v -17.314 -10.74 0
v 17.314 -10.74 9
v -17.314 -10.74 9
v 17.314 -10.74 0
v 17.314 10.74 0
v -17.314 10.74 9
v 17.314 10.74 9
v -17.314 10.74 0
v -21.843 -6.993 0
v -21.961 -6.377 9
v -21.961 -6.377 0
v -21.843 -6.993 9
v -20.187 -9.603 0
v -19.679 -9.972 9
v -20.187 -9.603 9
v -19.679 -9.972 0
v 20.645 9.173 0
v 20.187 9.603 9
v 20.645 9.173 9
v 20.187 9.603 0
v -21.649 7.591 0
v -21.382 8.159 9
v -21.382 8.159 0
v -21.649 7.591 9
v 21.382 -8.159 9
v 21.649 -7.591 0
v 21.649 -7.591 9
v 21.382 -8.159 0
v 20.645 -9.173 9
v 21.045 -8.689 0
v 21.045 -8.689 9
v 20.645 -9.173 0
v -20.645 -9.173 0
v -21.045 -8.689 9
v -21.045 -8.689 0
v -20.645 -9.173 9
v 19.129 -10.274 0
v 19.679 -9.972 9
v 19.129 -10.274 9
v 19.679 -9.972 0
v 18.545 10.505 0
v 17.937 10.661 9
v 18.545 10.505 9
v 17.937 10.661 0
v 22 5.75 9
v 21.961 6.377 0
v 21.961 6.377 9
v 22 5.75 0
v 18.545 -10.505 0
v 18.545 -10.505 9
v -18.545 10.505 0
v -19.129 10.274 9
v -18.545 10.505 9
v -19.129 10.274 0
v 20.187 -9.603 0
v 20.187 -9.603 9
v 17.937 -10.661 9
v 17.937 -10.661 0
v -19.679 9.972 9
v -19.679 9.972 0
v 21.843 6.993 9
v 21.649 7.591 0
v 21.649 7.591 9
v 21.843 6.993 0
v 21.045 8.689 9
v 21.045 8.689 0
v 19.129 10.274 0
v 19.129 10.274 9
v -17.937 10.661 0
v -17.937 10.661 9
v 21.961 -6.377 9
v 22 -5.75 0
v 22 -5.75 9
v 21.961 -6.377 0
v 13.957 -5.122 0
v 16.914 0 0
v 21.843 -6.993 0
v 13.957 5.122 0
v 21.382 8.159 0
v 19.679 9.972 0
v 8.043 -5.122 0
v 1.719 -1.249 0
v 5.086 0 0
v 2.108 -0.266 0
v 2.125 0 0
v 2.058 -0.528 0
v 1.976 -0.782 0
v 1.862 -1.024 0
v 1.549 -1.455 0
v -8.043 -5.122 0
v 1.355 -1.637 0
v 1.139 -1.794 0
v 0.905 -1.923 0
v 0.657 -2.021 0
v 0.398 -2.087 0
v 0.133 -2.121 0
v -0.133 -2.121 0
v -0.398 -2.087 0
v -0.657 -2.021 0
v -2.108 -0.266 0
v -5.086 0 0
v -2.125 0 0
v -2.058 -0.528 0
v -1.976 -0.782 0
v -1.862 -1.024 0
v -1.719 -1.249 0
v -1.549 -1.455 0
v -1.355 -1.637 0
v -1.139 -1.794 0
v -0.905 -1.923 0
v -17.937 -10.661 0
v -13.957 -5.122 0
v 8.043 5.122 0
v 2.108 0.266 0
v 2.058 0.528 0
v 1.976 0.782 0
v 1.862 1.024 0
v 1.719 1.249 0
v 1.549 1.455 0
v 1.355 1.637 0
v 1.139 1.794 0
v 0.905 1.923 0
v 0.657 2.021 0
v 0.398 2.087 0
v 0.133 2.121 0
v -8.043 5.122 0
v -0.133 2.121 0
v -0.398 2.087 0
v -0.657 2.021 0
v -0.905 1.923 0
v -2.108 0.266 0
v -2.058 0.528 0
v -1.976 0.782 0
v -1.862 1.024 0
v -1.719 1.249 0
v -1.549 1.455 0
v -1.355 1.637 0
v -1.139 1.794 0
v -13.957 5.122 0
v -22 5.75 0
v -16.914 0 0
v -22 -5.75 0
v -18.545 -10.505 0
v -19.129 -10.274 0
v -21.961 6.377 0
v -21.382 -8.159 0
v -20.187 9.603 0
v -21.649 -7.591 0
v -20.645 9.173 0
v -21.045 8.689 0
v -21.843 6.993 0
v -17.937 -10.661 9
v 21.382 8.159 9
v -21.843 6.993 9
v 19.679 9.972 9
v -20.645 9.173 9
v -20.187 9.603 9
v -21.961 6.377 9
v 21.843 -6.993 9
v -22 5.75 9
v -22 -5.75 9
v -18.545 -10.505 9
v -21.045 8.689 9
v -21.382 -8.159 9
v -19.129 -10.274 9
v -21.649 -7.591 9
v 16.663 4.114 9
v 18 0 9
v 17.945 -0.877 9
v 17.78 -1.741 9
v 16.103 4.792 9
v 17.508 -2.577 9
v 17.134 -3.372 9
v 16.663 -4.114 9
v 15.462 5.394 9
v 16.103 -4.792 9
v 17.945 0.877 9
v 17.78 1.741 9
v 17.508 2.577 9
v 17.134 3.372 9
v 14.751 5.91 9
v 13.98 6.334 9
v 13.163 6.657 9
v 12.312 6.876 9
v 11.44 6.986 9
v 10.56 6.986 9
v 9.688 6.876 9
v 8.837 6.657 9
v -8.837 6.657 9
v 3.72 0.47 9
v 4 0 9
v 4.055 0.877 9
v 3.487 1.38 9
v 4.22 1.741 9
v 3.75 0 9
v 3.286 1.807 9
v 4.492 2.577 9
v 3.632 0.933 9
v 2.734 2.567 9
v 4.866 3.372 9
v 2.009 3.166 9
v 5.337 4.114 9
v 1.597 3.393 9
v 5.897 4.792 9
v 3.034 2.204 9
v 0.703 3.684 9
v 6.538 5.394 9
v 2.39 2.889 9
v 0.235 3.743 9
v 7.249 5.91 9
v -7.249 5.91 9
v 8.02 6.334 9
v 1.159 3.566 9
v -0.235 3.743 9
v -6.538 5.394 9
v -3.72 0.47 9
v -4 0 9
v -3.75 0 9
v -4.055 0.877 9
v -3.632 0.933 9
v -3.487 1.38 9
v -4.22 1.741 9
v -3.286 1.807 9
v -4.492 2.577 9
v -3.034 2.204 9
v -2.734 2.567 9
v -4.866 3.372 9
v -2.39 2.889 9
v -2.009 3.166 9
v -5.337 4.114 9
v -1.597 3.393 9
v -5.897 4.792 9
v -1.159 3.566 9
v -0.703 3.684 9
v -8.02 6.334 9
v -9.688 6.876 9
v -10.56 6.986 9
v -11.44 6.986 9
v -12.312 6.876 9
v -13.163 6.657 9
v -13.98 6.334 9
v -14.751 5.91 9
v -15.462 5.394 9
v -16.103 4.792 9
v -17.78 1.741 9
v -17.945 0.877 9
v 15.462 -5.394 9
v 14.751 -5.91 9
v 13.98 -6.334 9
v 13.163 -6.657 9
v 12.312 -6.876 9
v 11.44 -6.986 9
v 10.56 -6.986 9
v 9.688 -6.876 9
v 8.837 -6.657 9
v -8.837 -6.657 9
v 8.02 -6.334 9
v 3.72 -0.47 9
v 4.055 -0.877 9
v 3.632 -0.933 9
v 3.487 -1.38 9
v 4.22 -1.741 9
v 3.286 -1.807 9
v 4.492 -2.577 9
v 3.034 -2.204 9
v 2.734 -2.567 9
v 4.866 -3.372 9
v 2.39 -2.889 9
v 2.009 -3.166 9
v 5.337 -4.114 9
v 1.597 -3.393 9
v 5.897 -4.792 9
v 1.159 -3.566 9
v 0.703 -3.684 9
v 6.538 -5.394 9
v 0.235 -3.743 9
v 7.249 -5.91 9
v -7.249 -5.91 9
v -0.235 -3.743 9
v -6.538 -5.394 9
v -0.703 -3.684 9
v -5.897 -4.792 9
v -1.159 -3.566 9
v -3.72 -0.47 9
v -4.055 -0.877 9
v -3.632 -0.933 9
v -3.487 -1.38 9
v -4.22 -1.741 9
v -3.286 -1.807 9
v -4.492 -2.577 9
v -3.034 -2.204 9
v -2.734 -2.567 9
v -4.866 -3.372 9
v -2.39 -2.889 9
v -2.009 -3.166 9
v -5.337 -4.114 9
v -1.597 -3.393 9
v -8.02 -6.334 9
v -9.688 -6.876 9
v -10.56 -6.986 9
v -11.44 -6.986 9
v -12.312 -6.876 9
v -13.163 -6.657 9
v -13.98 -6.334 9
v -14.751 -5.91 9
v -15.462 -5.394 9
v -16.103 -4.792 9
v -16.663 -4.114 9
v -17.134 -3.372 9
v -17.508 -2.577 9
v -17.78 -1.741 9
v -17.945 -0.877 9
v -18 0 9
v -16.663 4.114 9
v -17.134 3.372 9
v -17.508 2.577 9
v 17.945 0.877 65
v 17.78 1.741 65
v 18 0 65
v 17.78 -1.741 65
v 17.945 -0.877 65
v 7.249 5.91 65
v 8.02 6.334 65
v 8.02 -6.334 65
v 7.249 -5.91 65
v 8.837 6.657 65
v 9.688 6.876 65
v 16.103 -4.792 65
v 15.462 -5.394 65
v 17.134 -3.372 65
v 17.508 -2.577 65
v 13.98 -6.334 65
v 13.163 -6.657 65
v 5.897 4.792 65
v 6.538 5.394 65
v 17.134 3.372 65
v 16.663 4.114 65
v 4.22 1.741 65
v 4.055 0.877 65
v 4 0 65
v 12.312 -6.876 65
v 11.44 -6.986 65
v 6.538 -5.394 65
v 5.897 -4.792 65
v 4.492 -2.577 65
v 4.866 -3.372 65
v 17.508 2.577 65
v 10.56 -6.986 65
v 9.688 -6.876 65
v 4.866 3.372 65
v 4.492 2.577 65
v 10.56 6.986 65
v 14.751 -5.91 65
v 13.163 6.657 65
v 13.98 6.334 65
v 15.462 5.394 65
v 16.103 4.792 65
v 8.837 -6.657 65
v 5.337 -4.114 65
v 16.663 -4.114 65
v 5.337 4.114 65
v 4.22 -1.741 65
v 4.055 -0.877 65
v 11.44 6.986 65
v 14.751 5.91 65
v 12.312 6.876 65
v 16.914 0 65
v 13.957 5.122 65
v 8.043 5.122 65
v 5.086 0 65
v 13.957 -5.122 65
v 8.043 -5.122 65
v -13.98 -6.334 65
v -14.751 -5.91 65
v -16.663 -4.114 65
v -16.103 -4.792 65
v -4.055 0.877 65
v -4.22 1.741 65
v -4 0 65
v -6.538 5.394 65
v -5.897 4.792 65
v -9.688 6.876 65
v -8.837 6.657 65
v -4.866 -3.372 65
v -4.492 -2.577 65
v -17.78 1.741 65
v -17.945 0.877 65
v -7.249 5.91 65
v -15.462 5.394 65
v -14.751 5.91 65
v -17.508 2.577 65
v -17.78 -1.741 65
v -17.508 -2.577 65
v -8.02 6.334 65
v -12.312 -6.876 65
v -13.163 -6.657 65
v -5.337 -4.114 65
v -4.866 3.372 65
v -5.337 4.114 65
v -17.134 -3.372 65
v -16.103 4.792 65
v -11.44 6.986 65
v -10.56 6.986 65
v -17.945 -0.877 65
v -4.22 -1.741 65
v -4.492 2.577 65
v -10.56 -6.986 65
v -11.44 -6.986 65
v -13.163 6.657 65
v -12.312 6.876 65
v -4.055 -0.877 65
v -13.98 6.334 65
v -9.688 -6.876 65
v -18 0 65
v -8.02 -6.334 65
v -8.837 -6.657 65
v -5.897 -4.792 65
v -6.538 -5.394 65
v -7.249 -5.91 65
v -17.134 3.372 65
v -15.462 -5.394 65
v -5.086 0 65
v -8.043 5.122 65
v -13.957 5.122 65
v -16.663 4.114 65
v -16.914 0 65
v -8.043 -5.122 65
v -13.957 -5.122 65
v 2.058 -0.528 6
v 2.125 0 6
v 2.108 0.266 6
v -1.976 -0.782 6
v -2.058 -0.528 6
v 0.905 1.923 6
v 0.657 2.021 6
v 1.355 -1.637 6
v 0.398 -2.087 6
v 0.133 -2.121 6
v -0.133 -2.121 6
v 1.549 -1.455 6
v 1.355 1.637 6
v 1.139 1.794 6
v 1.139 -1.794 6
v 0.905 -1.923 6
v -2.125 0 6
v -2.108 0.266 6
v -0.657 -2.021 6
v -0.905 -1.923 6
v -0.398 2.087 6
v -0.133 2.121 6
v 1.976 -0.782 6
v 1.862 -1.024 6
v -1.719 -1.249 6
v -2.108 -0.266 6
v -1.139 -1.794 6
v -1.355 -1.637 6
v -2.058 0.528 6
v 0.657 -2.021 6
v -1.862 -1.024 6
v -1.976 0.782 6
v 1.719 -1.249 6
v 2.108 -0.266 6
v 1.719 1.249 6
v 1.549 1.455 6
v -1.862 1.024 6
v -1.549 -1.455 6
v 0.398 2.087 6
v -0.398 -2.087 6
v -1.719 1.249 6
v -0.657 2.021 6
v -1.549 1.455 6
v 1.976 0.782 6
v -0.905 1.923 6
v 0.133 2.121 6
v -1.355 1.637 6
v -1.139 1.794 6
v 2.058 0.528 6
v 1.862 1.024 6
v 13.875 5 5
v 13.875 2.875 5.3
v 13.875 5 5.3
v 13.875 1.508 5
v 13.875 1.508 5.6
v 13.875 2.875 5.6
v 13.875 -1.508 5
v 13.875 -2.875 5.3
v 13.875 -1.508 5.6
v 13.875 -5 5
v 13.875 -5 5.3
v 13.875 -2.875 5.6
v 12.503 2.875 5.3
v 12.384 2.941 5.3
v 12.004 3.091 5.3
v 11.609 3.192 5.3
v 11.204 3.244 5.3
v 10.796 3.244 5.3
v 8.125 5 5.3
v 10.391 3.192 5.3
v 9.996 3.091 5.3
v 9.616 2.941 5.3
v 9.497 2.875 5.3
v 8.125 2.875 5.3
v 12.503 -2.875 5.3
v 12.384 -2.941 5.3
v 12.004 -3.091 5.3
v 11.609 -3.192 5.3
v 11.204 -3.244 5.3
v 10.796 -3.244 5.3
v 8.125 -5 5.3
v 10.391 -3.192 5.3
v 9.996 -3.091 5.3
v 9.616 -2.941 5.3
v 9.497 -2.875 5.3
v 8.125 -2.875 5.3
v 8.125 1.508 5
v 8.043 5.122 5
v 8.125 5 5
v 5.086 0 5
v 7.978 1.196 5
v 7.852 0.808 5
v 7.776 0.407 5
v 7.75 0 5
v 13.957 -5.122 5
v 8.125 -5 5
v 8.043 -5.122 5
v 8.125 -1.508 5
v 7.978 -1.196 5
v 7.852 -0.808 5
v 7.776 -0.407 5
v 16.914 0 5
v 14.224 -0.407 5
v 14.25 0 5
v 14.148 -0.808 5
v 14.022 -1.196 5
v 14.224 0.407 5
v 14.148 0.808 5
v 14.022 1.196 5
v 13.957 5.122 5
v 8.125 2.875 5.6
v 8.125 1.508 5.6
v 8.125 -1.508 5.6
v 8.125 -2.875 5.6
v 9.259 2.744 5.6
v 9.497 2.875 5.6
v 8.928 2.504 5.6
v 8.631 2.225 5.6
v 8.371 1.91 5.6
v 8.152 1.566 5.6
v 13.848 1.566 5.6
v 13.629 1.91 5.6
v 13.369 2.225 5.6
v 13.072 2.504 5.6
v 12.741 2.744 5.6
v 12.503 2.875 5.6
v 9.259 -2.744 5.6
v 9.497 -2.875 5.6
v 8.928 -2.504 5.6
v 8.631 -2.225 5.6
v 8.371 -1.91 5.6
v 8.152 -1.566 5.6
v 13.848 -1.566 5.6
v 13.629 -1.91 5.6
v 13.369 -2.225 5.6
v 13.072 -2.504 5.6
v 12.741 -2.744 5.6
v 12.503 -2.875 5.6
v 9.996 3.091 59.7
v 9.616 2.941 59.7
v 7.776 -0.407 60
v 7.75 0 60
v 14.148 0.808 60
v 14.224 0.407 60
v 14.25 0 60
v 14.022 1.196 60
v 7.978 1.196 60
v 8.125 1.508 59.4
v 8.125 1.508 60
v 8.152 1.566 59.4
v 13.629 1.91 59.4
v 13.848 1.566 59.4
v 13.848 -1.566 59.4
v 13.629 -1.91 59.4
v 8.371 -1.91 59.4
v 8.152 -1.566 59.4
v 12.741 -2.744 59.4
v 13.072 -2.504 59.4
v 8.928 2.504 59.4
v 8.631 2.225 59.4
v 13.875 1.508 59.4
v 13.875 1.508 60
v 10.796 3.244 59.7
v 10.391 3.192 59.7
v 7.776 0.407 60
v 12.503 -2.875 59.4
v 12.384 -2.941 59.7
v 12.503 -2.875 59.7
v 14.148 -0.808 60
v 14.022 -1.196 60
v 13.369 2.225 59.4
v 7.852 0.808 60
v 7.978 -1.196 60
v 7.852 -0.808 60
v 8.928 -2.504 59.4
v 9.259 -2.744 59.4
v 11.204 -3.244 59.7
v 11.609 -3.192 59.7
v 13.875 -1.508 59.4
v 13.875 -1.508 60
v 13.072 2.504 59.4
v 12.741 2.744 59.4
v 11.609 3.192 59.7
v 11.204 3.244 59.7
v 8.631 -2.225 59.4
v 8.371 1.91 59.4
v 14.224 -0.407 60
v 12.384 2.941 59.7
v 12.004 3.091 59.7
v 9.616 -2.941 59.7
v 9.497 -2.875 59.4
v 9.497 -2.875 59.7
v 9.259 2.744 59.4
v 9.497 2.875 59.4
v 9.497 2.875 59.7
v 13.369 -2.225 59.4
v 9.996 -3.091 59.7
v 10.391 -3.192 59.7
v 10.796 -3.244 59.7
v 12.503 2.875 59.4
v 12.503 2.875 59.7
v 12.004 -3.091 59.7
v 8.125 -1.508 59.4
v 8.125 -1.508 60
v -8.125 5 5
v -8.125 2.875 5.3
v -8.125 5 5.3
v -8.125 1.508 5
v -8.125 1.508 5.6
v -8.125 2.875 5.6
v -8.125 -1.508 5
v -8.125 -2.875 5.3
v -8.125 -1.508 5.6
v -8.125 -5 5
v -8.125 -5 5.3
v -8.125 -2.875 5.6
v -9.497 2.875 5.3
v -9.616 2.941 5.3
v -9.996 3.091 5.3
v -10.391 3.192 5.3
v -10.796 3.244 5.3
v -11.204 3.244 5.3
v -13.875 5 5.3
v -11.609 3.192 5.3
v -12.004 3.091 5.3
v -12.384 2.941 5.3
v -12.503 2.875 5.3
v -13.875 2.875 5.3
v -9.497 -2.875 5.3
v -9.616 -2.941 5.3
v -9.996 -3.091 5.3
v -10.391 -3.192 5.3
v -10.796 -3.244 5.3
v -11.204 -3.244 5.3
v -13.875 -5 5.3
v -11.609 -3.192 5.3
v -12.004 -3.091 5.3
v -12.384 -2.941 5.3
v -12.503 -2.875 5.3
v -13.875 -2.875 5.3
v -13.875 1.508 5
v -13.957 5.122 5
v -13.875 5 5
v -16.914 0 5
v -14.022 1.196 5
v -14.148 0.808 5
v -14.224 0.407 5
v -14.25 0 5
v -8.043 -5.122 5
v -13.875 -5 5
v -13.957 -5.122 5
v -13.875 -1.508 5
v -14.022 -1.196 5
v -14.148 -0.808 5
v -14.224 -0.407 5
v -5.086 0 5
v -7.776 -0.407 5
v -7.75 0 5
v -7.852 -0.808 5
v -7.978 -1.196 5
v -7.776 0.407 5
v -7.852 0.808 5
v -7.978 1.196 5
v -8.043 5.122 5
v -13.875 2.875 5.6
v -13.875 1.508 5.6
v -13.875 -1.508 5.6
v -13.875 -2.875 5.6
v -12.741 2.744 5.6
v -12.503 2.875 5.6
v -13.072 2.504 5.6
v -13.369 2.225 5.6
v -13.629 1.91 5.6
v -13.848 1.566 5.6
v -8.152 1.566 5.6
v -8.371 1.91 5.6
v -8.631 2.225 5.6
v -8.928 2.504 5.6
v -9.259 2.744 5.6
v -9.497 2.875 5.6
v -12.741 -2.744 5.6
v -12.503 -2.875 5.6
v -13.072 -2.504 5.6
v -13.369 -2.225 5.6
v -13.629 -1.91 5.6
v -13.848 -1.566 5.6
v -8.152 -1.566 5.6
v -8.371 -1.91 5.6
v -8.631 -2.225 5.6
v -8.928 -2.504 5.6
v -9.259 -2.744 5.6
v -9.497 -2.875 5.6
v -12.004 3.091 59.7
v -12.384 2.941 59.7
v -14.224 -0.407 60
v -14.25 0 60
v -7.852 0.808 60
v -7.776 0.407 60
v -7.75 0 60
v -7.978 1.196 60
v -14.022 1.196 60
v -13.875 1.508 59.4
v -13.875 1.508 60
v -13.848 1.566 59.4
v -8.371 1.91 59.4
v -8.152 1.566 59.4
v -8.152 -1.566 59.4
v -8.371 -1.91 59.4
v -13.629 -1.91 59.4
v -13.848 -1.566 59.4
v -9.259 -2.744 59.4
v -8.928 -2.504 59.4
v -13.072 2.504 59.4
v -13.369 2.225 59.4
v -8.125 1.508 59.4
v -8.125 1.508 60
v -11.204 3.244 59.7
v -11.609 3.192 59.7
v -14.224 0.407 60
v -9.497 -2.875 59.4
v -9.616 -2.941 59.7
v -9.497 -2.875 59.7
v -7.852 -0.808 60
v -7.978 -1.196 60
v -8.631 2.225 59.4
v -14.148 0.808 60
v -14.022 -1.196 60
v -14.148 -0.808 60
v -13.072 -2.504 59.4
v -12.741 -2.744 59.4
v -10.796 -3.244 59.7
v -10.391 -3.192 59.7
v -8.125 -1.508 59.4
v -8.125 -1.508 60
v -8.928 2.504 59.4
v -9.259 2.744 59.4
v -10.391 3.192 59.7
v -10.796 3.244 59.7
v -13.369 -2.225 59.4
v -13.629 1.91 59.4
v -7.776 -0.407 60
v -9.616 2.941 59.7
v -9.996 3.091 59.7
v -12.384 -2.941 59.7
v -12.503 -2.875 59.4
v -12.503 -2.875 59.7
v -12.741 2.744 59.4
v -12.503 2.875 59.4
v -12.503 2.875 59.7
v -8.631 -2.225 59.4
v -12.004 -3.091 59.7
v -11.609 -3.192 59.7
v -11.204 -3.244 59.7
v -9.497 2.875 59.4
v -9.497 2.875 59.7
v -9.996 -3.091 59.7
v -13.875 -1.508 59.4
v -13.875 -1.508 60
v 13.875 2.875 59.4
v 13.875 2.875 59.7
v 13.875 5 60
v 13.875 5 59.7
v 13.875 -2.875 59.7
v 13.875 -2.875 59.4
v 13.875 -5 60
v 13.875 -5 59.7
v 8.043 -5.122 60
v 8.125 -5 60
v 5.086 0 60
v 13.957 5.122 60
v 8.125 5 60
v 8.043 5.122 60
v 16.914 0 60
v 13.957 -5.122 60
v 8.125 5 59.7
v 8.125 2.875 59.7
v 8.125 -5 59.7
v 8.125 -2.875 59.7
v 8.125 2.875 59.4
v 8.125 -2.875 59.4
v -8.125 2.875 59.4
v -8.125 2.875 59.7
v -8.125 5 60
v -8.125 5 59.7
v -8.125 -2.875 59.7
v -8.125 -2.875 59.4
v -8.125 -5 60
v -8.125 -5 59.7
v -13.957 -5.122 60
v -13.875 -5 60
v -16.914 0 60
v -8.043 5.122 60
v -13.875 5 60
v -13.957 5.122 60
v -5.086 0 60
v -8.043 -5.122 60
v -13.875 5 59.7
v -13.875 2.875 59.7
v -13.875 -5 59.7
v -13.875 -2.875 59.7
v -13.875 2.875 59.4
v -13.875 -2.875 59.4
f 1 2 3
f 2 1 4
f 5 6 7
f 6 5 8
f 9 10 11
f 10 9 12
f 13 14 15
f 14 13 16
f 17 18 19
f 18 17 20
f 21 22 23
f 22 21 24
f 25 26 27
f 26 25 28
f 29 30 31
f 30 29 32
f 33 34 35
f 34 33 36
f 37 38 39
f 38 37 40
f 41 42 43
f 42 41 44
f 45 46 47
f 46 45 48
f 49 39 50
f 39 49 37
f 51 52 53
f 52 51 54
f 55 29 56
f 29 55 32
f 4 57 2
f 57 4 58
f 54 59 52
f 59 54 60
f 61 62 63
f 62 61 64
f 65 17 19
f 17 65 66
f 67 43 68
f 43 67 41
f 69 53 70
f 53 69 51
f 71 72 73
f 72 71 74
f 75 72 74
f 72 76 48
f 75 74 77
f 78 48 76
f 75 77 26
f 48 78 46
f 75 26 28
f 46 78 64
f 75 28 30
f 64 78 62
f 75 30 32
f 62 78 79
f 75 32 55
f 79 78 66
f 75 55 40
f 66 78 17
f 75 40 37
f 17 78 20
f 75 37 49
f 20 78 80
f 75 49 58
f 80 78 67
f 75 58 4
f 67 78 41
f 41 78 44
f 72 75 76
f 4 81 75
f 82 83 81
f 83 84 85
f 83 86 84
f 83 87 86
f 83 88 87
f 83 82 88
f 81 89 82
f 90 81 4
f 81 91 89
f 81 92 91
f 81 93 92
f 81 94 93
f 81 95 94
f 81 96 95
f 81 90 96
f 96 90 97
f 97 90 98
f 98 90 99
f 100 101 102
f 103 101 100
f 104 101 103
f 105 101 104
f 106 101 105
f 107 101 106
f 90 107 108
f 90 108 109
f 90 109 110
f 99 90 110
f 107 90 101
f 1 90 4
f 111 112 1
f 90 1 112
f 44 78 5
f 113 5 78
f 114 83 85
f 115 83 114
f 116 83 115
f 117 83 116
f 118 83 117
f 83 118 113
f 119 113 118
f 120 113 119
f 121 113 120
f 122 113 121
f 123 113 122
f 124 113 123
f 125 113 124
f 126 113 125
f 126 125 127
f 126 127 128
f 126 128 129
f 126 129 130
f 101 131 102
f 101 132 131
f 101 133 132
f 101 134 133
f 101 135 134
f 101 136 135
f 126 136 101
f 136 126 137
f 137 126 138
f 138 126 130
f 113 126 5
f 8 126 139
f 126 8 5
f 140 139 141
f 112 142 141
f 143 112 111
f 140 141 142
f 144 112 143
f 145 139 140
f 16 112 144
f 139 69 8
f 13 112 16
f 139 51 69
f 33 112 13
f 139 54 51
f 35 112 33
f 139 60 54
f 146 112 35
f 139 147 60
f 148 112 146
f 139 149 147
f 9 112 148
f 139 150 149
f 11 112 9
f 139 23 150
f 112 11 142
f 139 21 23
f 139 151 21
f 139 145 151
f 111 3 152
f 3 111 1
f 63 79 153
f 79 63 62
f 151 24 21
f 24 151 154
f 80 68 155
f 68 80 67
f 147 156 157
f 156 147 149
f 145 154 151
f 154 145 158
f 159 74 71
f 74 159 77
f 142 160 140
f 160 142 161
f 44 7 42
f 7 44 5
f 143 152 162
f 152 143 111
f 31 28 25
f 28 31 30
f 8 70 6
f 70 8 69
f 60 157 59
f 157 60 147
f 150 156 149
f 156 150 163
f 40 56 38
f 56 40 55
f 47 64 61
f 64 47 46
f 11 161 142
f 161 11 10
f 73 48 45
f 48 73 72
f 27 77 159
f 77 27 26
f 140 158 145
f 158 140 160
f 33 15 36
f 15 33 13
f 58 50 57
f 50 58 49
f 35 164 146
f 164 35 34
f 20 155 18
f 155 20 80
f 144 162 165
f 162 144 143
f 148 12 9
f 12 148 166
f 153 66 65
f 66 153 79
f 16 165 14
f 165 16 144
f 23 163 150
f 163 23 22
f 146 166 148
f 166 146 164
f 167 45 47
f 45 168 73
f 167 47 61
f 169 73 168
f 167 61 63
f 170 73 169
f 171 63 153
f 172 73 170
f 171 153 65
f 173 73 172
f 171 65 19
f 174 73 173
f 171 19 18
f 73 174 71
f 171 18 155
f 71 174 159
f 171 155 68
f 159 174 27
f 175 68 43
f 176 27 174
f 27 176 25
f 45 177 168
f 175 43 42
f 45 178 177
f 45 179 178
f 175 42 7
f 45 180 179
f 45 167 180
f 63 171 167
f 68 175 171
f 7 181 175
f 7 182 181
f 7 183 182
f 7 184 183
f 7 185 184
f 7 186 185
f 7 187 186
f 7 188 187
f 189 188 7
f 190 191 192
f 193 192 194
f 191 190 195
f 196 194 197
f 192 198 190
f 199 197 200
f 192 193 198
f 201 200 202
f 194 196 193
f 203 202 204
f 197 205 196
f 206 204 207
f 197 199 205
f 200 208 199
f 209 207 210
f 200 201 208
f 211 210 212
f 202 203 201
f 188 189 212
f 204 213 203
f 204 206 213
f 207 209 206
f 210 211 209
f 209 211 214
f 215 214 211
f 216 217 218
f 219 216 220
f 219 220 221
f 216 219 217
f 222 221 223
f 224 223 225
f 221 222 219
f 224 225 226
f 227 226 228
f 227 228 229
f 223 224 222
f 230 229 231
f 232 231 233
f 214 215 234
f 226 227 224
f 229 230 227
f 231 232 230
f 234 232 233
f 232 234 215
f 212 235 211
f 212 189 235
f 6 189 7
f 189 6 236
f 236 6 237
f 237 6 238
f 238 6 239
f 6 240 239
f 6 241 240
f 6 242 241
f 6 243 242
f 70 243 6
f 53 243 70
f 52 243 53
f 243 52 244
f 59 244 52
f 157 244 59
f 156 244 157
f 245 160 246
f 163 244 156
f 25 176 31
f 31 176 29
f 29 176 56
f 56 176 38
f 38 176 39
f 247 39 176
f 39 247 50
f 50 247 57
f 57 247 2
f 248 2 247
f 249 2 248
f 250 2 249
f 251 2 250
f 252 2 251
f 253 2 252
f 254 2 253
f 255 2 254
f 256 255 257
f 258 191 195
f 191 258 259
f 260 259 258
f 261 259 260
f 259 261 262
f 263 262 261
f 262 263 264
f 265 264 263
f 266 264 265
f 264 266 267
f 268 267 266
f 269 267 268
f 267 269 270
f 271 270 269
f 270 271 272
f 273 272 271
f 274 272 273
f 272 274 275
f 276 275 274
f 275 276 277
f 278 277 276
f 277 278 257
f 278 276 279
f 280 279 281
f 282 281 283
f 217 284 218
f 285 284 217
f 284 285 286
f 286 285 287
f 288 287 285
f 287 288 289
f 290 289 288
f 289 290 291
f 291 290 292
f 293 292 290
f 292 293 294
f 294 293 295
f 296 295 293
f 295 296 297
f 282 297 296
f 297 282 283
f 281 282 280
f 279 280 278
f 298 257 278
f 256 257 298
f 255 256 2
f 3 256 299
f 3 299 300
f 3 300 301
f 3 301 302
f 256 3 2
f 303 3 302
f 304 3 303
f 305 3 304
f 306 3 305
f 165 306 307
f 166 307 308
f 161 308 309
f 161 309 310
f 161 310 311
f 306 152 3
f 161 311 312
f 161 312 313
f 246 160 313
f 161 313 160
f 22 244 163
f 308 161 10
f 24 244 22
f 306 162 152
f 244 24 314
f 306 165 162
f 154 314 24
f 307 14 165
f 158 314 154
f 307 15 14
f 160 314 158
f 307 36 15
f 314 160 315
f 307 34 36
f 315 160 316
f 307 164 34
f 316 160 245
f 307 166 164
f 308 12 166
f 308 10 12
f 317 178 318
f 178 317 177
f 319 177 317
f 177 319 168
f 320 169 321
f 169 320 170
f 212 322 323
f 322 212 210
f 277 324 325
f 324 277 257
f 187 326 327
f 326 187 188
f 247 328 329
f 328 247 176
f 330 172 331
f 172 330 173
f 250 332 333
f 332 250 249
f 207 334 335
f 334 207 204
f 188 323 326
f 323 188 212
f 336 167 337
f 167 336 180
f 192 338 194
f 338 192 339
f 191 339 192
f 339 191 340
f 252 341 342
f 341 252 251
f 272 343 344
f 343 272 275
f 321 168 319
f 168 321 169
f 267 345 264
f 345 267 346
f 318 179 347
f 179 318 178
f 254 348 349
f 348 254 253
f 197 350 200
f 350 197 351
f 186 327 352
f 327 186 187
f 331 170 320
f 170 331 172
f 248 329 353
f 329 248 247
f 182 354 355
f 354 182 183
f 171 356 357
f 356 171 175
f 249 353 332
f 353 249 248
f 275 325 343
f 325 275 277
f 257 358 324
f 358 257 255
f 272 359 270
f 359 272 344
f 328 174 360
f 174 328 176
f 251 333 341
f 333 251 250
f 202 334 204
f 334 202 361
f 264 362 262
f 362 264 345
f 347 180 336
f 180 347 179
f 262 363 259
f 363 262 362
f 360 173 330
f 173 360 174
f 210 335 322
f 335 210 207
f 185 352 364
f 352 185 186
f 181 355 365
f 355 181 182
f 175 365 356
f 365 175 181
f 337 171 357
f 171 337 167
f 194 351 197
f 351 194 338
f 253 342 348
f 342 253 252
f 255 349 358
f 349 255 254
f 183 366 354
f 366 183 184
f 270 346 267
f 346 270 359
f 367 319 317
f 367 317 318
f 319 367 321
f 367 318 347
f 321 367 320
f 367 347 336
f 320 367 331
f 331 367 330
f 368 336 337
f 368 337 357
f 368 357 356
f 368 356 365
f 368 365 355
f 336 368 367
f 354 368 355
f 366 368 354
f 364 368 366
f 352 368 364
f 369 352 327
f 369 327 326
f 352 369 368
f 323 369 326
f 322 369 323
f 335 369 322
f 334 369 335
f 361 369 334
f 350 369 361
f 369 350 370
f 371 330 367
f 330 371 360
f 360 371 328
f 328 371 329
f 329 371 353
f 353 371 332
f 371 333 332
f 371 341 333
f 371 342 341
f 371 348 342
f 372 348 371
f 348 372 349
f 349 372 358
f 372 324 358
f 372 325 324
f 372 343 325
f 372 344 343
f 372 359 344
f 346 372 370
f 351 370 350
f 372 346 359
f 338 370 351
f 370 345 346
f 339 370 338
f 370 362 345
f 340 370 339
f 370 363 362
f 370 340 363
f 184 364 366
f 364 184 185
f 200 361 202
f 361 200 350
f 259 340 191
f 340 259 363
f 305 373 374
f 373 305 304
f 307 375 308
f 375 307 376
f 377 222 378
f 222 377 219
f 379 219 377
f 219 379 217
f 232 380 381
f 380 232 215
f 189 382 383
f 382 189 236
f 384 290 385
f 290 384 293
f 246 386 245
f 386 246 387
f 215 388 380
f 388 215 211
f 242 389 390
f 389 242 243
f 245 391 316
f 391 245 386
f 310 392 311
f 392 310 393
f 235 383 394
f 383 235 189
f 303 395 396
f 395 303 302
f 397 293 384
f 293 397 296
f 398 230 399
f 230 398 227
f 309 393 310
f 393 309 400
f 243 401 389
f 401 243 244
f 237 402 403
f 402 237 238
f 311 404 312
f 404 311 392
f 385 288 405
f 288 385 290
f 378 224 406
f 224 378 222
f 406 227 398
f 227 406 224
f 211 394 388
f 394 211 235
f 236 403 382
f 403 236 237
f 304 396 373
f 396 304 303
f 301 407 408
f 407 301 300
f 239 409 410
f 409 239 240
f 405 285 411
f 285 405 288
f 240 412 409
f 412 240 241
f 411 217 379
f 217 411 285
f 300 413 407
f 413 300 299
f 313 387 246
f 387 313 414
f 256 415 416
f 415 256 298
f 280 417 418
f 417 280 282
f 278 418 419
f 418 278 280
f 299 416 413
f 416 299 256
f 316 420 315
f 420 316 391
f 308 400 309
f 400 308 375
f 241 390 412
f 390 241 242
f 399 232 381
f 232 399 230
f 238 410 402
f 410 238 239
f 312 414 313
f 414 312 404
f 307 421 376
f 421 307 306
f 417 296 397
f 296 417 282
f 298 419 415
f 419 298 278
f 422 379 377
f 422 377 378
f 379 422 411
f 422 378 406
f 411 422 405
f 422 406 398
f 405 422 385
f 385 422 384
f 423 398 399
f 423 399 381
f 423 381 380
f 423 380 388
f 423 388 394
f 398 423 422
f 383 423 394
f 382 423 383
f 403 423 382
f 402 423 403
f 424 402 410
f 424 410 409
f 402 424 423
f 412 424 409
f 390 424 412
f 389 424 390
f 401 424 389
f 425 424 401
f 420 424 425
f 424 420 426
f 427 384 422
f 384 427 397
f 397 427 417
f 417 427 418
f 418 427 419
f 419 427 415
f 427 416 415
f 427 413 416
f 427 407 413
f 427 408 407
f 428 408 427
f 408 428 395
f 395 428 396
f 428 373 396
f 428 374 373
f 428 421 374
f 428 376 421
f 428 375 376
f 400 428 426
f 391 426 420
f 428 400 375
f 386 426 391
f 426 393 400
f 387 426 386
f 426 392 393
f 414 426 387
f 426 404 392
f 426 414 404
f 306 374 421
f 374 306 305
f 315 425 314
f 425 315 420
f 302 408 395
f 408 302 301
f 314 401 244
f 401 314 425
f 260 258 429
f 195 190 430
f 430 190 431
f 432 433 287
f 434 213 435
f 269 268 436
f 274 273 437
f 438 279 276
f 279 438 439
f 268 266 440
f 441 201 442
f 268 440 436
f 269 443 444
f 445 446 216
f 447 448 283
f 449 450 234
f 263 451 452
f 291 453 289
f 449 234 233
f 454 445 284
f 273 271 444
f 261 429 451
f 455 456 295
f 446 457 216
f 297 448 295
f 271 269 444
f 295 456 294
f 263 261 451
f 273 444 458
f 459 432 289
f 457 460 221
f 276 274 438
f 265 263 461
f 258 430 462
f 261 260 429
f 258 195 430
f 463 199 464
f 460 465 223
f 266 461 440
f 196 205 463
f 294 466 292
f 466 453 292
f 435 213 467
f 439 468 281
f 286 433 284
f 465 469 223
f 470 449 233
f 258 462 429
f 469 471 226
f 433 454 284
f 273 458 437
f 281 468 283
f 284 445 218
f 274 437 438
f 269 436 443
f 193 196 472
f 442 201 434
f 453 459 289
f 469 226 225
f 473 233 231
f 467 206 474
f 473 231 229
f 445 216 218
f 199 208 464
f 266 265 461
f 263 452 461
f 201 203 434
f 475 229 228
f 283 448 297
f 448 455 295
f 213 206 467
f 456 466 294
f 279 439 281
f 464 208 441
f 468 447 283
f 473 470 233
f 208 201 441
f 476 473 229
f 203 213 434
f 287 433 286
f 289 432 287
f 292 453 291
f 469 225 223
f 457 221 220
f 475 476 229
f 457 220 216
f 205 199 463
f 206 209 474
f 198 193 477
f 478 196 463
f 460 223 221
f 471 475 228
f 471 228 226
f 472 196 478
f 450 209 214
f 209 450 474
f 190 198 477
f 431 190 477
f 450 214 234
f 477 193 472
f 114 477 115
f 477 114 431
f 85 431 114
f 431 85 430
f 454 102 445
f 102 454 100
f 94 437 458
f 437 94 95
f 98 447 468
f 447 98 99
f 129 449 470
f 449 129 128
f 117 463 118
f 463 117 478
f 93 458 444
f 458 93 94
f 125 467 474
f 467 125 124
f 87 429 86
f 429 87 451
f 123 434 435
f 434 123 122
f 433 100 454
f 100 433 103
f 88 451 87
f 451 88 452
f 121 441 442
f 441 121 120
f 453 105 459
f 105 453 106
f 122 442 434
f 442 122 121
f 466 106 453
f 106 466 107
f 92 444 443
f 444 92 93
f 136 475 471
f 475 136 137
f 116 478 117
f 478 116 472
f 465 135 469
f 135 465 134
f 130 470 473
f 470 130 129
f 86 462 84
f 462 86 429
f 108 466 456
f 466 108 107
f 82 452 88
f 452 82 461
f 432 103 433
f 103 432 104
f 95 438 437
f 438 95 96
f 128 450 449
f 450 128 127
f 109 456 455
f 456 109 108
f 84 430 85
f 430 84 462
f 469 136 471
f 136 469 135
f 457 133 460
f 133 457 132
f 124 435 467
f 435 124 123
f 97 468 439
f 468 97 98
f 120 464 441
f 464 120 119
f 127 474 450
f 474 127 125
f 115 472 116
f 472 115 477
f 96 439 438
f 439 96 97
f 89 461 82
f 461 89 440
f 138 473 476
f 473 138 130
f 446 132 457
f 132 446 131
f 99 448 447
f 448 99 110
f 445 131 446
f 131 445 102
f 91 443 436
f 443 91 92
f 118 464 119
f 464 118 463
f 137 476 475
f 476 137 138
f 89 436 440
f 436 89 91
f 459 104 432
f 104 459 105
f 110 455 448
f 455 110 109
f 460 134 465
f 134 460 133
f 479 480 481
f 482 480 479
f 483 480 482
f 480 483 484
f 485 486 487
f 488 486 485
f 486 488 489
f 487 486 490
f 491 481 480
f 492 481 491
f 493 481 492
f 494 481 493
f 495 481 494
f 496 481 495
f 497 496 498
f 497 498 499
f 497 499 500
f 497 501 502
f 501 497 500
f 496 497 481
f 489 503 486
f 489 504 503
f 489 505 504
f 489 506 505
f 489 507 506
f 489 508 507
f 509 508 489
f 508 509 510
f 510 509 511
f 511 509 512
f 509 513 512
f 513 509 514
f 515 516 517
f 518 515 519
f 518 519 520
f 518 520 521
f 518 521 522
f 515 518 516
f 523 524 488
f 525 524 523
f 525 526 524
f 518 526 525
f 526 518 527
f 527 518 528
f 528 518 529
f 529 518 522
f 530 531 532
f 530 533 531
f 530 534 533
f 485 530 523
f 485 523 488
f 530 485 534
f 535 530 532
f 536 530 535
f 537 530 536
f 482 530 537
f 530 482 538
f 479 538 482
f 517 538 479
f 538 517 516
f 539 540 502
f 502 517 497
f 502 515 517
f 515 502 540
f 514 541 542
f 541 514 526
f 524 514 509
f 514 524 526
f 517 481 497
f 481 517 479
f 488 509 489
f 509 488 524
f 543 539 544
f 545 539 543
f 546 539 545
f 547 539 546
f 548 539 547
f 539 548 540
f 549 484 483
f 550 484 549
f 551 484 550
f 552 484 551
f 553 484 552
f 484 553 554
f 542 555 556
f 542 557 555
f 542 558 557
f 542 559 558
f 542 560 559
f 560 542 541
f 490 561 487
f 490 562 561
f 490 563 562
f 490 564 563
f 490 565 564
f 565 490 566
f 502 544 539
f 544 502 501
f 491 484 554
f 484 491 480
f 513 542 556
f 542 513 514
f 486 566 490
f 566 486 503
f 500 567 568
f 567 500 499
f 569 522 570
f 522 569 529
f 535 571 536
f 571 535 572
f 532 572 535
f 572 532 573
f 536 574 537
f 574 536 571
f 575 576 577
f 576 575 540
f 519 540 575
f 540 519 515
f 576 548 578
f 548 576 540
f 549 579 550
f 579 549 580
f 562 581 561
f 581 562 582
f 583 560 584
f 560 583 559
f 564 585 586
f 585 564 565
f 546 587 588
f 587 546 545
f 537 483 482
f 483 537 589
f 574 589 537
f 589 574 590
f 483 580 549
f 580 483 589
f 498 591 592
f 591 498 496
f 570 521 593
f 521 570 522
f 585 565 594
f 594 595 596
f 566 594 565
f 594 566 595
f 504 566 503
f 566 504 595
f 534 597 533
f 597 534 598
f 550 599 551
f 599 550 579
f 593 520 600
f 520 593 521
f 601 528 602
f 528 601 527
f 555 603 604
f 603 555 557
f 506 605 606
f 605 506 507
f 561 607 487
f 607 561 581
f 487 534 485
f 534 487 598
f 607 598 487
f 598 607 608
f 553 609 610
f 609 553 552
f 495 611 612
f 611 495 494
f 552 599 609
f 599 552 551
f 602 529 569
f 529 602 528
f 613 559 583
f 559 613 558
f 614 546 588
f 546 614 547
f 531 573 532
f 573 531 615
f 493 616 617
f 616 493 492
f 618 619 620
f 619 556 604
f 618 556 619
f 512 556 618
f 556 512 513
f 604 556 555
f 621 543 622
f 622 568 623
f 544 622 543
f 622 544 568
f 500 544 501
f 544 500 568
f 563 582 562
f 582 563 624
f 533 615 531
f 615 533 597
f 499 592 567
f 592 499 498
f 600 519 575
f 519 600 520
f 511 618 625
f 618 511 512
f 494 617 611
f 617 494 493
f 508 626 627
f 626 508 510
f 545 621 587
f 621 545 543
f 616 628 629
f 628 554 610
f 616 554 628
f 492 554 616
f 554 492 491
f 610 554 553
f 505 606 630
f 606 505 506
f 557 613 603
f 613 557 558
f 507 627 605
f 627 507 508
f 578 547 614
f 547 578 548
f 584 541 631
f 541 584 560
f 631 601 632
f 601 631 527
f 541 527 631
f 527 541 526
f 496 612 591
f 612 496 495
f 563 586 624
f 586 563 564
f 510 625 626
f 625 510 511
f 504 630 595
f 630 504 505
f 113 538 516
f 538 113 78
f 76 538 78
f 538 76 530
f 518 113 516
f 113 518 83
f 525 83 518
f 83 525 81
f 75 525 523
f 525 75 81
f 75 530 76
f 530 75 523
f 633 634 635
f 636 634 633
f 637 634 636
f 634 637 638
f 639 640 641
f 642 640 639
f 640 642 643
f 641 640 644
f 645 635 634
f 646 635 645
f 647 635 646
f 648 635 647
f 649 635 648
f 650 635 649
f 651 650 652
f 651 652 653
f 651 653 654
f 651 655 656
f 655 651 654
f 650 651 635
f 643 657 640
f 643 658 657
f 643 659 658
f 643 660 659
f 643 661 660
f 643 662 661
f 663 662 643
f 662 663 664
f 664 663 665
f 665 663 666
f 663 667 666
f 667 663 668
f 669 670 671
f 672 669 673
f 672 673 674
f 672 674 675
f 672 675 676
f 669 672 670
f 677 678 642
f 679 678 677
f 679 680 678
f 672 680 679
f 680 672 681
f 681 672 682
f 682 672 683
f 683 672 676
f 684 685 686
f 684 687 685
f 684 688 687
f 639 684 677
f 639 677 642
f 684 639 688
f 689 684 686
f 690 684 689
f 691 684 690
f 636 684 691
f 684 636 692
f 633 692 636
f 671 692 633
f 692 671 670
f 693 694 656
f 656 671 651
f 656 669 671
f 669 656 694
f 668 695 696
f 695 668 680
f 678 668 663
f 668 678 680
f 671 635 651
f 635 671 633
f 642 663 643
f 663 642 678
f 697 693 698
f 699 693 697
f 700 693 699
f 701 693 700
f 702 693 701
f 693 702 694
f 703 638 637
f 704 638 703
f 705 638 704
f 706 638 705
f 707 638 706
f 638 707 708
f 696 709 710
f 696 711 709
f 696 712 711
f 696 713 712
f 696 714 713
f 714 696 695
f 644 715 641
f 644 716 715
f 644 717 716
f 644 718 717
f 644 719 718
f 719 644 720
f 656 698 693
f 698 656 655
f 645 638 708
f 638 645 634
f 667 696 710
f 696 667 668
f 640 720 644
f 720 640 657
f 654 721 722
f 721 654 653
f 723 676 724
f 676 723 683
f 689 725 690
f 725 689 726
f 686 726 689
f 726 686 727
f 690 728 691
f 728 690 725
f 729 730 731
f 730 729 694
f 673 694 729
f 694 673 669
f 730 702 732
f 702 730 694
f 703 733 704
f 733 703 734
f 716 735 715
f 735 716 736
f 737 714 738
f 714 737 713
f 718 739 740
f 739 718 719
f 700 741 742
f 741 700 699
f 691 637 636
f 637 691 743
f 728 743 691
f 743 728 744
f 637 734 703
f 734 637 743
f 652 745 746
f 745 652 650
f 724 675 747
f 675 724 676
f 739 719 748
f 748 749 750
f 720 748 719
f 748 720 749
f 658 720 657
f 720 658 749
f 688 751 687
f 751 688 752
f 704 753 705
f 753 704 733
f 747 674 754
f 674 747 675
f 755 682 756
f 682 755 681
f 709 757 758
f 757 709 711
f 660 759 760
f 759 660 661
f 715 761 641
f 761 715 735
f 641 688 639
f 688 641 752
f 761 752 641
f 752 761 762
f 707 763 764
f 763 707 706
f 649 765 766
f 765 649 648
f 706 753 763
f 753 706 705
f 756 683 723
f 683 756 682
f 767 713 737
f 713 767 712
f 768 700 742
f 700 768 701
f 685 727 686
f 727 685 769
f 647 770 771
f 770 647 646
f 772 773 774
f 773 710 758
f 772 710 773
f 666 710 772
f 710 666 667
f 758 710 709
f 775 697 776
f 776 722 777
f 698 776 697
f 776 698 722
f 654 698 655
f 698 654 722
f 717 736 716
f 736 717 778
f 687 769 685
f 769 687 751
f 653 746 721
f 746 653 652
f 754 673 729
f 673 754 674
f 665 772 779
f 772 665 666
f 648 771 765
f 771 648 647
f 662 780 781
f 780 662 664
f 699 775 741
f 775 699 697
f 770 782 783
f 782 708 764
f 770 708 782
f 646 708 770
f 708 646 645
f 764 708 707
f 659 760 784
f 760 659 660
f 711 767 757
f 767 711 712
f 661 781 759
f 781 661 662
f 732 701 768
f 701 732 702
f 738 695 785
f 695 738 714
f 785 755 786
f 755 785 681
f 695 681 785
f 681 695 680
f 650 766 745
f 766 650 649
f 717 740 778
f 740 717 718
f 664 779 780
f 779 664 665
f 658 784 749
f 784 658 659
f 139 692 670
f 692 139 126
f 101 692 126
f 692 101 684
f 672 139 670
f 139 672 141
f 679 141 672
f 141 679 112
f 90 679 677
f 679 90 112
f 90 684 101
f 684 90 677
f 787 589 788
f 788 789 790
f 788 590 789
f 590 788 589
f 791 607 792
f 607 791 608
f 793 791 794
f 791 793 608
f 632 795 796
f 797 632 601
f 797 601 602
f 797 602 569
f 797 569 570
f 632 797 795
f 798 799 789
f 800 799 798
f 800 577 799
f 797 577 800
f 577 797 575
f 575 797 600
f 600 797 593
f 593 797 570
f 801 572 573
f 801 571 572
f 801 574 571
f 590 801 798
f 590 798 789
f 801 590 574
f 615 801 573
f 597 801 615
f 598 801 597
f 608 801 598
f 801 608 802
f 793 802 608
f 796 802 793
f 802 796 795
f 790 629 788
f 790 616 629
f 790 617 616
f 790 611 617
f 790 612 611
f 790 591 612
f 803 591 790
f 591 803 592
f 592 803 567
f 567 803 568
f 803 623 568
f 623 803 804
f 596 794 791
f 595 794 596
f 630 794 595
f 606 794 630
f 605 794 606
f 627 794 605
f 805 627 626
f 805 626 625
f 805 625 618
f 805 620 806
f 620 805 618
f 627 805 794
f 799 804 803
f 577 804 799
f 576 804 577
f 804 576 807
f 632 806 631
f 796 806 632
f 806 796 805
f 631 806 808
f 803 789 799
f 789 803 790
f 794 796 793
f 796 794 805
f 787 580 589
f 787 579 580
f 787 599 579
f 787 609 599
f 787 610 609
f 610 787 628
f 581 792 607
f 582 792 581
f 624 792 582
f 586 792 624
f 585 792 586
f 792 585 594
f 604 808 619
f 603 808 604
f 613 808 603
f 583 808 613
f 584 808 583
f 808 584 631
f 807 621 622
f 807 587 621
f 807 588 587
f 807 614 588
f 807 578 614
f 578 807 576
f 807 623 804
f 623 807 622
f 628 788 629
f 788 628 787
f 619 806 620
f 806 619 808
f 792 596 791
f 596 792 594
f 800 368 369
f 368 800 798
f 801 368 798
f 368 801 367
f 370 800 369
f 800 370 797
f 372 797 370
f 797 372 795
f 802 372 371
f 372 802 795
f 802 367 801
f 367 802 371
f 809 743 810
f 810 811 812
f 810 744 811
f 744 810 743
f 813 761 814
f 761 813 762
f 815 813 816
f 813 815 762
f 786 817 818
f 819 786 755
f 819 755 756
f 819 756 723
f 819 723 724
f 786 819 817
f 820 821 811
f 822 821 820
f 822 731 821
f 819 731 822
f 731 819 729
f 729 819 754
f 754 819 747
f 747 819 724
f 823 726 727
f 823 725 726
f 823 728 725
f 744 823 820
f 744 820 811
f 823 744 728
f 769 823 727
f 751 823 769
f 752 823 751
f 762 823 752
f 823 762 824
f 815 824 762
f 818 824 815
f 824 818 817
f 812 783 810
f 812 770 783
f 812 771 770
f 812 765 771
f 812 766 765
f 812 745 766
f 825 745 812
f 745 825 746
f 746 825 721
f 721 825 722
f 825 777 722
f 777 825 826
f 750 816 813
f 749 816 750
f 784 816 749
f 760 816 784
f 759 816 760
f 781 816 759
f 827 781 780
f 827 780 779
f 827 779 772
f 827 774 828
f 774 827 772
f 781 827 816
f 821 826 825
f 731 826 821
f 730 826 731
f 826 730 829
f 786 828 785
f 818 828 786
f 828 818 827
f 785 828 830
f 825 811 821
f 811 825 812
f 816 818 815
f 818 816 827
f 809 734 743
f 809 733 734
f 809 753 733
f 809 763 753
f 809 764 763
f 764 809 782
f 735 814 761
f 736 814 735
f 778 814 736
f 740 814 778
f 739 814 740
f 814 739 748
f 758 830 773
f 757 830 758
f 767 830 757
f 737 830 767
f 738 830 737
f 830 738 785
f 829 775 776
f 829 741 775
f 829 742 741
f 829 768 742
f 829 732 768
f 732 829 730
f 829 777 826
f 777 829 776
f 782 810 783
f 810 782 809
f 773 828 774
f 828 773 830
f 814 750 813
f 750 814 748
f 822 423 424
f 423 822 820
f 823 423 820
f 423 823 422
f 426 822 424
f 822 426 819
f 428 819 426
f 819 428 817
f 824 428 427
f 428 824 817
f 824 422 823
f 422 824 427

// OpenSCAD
$fn = 50;


difference() {
	union() {
		hull() {
			translate(v = [-17.0000000000, 5.7500000000, 0]) {
				cylinder(h = 9, r = 5);
			}
			translate(v = [17.0000000000, 5.7500000000, 0]) {
				cylinder(h = 9, r = 5);
			}
			translate(v = [-17.0000000000, -5.7500000000, 0]) {
				cylinder(h = 9, r = 5);
			}
			translate(v = [17.0000000000, -5.7500000000, 0]) {
				cylinder(h = 9, r = 5);
			}
		}
		translate(v = [11.0000000000, 0, 0.0000000000]) {
			cylinder(h = 65, r = 7.0000000000);
		}
		translate(v = [-11.0000000000, 0, 0.0000000000]) {
			cylinder(h = 65, r = 7.0000000000);
		}
	}
	union() {
		translate(v = [0, 0, 9]) {
			rotate(a = [0, 0, 0]) {
				difference() {
					union() {
						#translate(v = [0, 0, -60.0000000000]) {
							cylinder(h = 60, r = 2.0000000000);
						}
						#translate(v = [0, 0, -3]) {
							cylinder(h = 3, r1 = 2.1250000000, r2 = 3.7500000000);
						}
						#translate(v = [0, 0, -60.0000000000]) {
							cylinder(h = 60, r = 2.1250000000);
						}
						#translate(v = [0, 0, -60.0000000000]) {
							cylinder(h = 60, r = 2.0000000000);
						}
					}
					union();
				}
			}
		}
		translate(v = [11.0000000000, 0, 0]) {
			rotate(a = [0, 0, 0]) {
				difference() {
					union() {
						#translate(v = [-2.8750000000, -5.0000000000, -0.3000000000]) {
							cube(size = [5.7500000000, 10, 0.3000000000]);
						}
						#translate(v = [-2.8750000000, -2.8750000000, -0.6000000000]) {
							cube(size = [5.7500000000, 5.7500000000, 0.3000000000]);
						}
						#translate(v = [-2.8750000000, -5.0000000000, 5]) {
							cube(size = [5.7500000000, 10, 0.3000000000]);
						}
						#translate(v = [-2.8750000000, -2.8750000000, 5.3000000000]) {
							cube(size = [5.7500000000, 5.7500000000, 0.3000000000]);
						}
						#translate(v = [0, 0, -100.0000000000]) {
							cylinder(h = 200, r = 3.2500000000);
						}
						#linear_extrude(height = 5) {
							polygon(points = [[5.9142500000, 0.0000000000], [2.9571250000, 5.1218907443], [-2.9571250000, 5.1218907443], [-5.9142500000, 0.0000000000], [-2.9571250000, -5.1218907443], [2.9571250000, -5.1218907443]]);
						}
						#translate(v = [-2.8750000000, -5.0000000000, -0.3000000000]) {
							cube(size = [5.7500000000, 10, 0.3000000000]);
						}
						#translate(v = [-2.8750000000, -2.8750000000, -0.6000000000]) {
							cube(size = [5.7500000000, 5.7500000000, 0.3000000000]);
						}
						#translate(v = [-2.8750000000, -5.0000000000, 5]) {
							cube(size = [5.7500000000, 10, 0.3000000000]);
						}
						#translate(v = [-2.8750000000, -2.8750000000, 5.3000000000]) {
							cube(size = [5.7500000000, 5.7500000000, 0.3000000000]);
						}
						#translate(v = [0, 0, -100.0000000000]) {
							cylinder(h = 200, r = 3.2500000000);
						}
						#translate(v = [-2.8750000000, -5.0000000000, -0.3000000000]) {
							cube(size = [5.7500000000, 10, 0.3000000000]);
						}
						#translate(v = [-2.8750000000, -2.8750000000, -0.6000000000]) {
							cube(size = [5.7500000000, 5.7500000000, 0.3000000000]);
						}
						#translate(v = [-2.8750000000, -5.0000000000, 5]) {
							cube(size = [5.7500000000, 10, 0.3000000000]);
						}
						#translate(v = [-2.8750000000, -2.8750000000, 5.3000000000]) {
							cube(size = [5.7500000000, 5.7500000000, 0.3000000000]);
						}
						#translate(v = [0, 0, -100.0000000000]) {
							cylinder(h = 200, r = 3.2500000000);
						}
					}
					union();
				}
			}
		}
		translate(v = [-11.0000000000, 0, 0]) {
			rotate(a = [0, 0, 0]) {
				difference() {
					union() {
						#translate(v = [-2.8750000000, -5.0000000000, -0.3000000000]) {
							cube(size = [5.7500000000, 10, 0.3000000000]);
						}
						#translate(v = [-2.8750000000, -2.8750000000, -0.6000000000]) {
							cube(size = [5.7500000000, 5.7500000000, 0.3000000000]);
						}
						#translate(v = [-2.8750000000, -5.0000000000, 5]) {
							cube(size = [5.7500000000, 10, 0.3000000000]);
						}
						#translate(v = [-2.8750000000, -2.8750000000, 5.3000000000]) {
							cube(size = [5.7500000000, 5.7500000000, 0.3000000000]);
						}
						#translate(v = [0, 0, -100.0000000000]) {
							cylinder(h = 200, r = 3.2500000000);
						}
						#linear_extrude(height = 5) {
							polygon(points = [[5.9142500000, 0.0000000000], [2.9571250000, 5.1218907443], [-2.9571250000, 5.1218907443], [-5.9142500000, 0.0000000000], [-2.9571250000, -5.1218907443], [2.9571250000, -5.1218907443]]);
						}
						#translate(v = [-2.8750000000, -5.0000000000, -0.3000000000]) {
							cube(size = [5.7500000000, 10, 0.3000000000]);
						}
						#translate(v = [-2.8750000000, -2.8750000000, -0.6000000000]) {
							cube(size = [5.7500000000, 5.7500000000, 0.3000000000]);
						}
						#translate(v = [-2.8750000000, -5.0000000000, 5]) {
							cube(size = [5.7500000000, 10, 0.3000000000]);
						}
						#translate(v = [-2.8750000000, -2.8750000000, 5.3000000000]) {
							cube(size = [5.7500000000, 5.7500000000, 0.3000000000]);
						}
						#translate(v = [0, 0, -100.0000000000]) {
							cylinder(h = 200, r = 3.2500000000);
						}
						#translate(v = [-2.8750000000, -5.0000000000, -0.3000000000]) {
							cube(size = [5.7500000000, 10, 0.3000000000]);
						}
						#translate(v = [-2.8750000000, -2.8750000000, -0.6000000000]) {
							cube(size = [5.7500000000, 5.7500000000, 0.3000000000]);
						}
						#translate(v = [-2.8750000000, -5.0000000000, 5]) {
							cube(size = [5.7500000000, 10, 0.3000000000]);
						}
						#translate(v = [-2.8750000000, -2.8750000000, 5.3000000000]) {
							cube(size = [5.7500000000, 5.7500000000, 0.3000000000]);
						}
						#translate(v = [0, 0, -100.0000000000]) {
							cylinder(h = 200, r = 3.2500000000);
						}
					}
					union();
				}
			}
		}
		translate(v = [11.0000000000, 0, 65]) {
			rotate(a = [0, 0, 0]) {
				difference() {
					union() {
						#translate(v = [-2.8750000000, -5.0000000000, -5.3000000000]) {
							cube(size = [5.7500000000, 10, 0.3000000000]);
						}
						#translate(v = [-2.8750000000, -2.8750000000, -5.6000000000]) {
							cube(size = [5.7500000000, 5.7500000000, 0.3000000000]);
						}
						#translate(v = [-2.8750000000, -5.0000000000, 0]) {
							cube(size = [5.7500000000, 10, 0.3000000000]);
						}
						#translate(v = [-2.8750000000, -2.8750000000, 0.3000000000]) {
							cube(size = [5.7500000000, 5.7500000000, 0.3000000000]);
						}
						#translate(v = [0, 0, -100.0000000000]) {
							cylinder(h = 200, r = 3.2500000000);
						}
						translate(v = [0, 0, -5]) {
							#linear_extrude(height = 5) {
								polygon(points = [[5.9142500000, 0.0000000000], [2.9571250000, 5.1218907443], [-2.9571250000, 5.1218907443], [-5.9142500000, 0.0000000000], [-2.9571250000, -5.1218907443], [2.9571250000, -5.1218907443]]);
							}
						}
						#translate(v = [-2.8750000000, -5.0000000000, -5.3000000000]) {
							cube(size = [5.7500000000, 10, 0.3000000000]);
						}
						#translate(v = [-2.8750000000, -2.8750000000, -5.6000000000]) {
							cube(size = [5.7500000000, 5.7500000000, 0.3000000000]);
						}
						#translate(v = [-2.8750000000, -5.0000000000, 0]) {
							cube(size = [5.7500000000, 10, 0.3000000000]);
						}
						#translate(v = [-2.8750000000, -2.8750000000, 0.3000000000]) {
							cube(size = [5.7500000000, 5.7500000000, 0.3000000000]);
						}
						#translate(v = [0, 0, -100.0000000000]) {
							cylinder(h = 200, r = 3.2500000000);
						}
						#translate(v = [-2.8750000000, -5.0000000000, -5.3000000000]) {
							cube(size = [5.7500000000, 10, 0.3000000000]);
						}
						#translate(v = [-2.8750000000, -2.8750000000, -5.6000000000]) {
							cube(size = [5.7500000000, 5.7500000000, 0.3000000000]);
						}
						#translate(v = [-2.8750000000, -5.0000000000, 0]) {
							cube(size = [5.7500000000, 10, 0.3000000000]);
						}
						#translate(v = [-2.8750000000, -2.8750000000, 0.3000000000]) {
							cube(size = [5.7500000000, 5.7500000000, 0.3000000000]);
						}
						#translate(v = [0, 0, -100.0000000000]) {
							cylinder(h = 200, r = 3.2500000000);
						}
					}
					union();
				}
			}
		}
		translate(v = [-11.0000000000, 0, 65]) {
			rotate(a = [0, 0, 0]) {
				difference() {
					union() {
						#translate(v = [-2.8750000000, -5.0000000000, -5.3000000000]) {
							cube(size = [5.7500000000, 10, 0.3000000000]);
						}
						#translate(v = [-2.8750000000, -2.8750000000, -5.6000000000]) {
							cube(size = [5.7500000000, 5.7500000000, 0.3000000000]);
						}
						#translate(v = [-2.8750000000, -5.0000000000, 0]) {
							cube(size = [5.7500000000, 10, 0.3000000000]);
						}
						#translate(v = [-2.8750000000, -2.8750000000, 0.3000000000]) {
							cube(size = [5.7500000000, 5.7500000000, 0.3000000000]);
						}
						#translate(v = [0, 0, -100.0000000000]) {
							cylinder(h = 200, r = 3.2500000000);
						}
						translate(v = [0, 0, -5]) {
							#linear_extrude(height = 5) {
								polygon(points = [[5.9142500000, 0.0000000000], [2.9571250000, 5.1218907443], [-2.9571250000, 5.1218907443], [-5.9142500000, 0.0000000000], [-2.9571250000, -5.1218907443], [2.9571250000, -5.1218907443]]);
							}
						}
						#translate(v = [-2.8750000000, -5.0000000000, -5.3000000000]) {
							cube(size = [5.7500000000, 10, 0.3000000000]);
						}
						#translate(v = [-2.8750000000, -2.8750000000, -5.6000000000]) {
							cube(size = [5.7500000000, 5.7500000000, 0.3000000000]);
						}
						#translate(v = [-2.8750000000, -5.0000000000, 0]) {
							cube(size = [5.7500000000, 10, 0.3000000000]);
						}
						#translate(v = [-2.8750000000, -2.8750000000, 0.3000000000]) {
							cube(size = [5.7500000000, 5.7500000000, 0.3000000000]);
						}
						#translate(v = [0, 0, -100.0000000000]) {
							cylinder(h = 200, r = 3.2500000000);
						}
						#translate(v = [-2.8750000000, -5.0000000000, -5.3000000000]) {
							cube(size = [5.7500000000, 10, 0.3000000000]);
						}
						#translate(v = [-2.8750000000, -2.8750000000, -5.6000000000]) {
							cube(size = [5.7500000000, 5.7500000000, 0.3000000000]);
						}
						#translate(v = [-2.8750000000, -5.0000000000, 0]) {
							cube(size = [5.7500000000, 10, 0.3000000000]);
						}
						#translate(v = [-2.8750000000, -2.8750000000, 0.3000000000]) {
							cube(size = [5.7500000000, 5.7500000000, 0.3000000000]);
						}
						#translate(v = [0, 0, -100.0000000000]) {
							cylinder(h = 200, r = 3.2500000000);
						}
					}
					union();
				}
			}
		}
	}
}
